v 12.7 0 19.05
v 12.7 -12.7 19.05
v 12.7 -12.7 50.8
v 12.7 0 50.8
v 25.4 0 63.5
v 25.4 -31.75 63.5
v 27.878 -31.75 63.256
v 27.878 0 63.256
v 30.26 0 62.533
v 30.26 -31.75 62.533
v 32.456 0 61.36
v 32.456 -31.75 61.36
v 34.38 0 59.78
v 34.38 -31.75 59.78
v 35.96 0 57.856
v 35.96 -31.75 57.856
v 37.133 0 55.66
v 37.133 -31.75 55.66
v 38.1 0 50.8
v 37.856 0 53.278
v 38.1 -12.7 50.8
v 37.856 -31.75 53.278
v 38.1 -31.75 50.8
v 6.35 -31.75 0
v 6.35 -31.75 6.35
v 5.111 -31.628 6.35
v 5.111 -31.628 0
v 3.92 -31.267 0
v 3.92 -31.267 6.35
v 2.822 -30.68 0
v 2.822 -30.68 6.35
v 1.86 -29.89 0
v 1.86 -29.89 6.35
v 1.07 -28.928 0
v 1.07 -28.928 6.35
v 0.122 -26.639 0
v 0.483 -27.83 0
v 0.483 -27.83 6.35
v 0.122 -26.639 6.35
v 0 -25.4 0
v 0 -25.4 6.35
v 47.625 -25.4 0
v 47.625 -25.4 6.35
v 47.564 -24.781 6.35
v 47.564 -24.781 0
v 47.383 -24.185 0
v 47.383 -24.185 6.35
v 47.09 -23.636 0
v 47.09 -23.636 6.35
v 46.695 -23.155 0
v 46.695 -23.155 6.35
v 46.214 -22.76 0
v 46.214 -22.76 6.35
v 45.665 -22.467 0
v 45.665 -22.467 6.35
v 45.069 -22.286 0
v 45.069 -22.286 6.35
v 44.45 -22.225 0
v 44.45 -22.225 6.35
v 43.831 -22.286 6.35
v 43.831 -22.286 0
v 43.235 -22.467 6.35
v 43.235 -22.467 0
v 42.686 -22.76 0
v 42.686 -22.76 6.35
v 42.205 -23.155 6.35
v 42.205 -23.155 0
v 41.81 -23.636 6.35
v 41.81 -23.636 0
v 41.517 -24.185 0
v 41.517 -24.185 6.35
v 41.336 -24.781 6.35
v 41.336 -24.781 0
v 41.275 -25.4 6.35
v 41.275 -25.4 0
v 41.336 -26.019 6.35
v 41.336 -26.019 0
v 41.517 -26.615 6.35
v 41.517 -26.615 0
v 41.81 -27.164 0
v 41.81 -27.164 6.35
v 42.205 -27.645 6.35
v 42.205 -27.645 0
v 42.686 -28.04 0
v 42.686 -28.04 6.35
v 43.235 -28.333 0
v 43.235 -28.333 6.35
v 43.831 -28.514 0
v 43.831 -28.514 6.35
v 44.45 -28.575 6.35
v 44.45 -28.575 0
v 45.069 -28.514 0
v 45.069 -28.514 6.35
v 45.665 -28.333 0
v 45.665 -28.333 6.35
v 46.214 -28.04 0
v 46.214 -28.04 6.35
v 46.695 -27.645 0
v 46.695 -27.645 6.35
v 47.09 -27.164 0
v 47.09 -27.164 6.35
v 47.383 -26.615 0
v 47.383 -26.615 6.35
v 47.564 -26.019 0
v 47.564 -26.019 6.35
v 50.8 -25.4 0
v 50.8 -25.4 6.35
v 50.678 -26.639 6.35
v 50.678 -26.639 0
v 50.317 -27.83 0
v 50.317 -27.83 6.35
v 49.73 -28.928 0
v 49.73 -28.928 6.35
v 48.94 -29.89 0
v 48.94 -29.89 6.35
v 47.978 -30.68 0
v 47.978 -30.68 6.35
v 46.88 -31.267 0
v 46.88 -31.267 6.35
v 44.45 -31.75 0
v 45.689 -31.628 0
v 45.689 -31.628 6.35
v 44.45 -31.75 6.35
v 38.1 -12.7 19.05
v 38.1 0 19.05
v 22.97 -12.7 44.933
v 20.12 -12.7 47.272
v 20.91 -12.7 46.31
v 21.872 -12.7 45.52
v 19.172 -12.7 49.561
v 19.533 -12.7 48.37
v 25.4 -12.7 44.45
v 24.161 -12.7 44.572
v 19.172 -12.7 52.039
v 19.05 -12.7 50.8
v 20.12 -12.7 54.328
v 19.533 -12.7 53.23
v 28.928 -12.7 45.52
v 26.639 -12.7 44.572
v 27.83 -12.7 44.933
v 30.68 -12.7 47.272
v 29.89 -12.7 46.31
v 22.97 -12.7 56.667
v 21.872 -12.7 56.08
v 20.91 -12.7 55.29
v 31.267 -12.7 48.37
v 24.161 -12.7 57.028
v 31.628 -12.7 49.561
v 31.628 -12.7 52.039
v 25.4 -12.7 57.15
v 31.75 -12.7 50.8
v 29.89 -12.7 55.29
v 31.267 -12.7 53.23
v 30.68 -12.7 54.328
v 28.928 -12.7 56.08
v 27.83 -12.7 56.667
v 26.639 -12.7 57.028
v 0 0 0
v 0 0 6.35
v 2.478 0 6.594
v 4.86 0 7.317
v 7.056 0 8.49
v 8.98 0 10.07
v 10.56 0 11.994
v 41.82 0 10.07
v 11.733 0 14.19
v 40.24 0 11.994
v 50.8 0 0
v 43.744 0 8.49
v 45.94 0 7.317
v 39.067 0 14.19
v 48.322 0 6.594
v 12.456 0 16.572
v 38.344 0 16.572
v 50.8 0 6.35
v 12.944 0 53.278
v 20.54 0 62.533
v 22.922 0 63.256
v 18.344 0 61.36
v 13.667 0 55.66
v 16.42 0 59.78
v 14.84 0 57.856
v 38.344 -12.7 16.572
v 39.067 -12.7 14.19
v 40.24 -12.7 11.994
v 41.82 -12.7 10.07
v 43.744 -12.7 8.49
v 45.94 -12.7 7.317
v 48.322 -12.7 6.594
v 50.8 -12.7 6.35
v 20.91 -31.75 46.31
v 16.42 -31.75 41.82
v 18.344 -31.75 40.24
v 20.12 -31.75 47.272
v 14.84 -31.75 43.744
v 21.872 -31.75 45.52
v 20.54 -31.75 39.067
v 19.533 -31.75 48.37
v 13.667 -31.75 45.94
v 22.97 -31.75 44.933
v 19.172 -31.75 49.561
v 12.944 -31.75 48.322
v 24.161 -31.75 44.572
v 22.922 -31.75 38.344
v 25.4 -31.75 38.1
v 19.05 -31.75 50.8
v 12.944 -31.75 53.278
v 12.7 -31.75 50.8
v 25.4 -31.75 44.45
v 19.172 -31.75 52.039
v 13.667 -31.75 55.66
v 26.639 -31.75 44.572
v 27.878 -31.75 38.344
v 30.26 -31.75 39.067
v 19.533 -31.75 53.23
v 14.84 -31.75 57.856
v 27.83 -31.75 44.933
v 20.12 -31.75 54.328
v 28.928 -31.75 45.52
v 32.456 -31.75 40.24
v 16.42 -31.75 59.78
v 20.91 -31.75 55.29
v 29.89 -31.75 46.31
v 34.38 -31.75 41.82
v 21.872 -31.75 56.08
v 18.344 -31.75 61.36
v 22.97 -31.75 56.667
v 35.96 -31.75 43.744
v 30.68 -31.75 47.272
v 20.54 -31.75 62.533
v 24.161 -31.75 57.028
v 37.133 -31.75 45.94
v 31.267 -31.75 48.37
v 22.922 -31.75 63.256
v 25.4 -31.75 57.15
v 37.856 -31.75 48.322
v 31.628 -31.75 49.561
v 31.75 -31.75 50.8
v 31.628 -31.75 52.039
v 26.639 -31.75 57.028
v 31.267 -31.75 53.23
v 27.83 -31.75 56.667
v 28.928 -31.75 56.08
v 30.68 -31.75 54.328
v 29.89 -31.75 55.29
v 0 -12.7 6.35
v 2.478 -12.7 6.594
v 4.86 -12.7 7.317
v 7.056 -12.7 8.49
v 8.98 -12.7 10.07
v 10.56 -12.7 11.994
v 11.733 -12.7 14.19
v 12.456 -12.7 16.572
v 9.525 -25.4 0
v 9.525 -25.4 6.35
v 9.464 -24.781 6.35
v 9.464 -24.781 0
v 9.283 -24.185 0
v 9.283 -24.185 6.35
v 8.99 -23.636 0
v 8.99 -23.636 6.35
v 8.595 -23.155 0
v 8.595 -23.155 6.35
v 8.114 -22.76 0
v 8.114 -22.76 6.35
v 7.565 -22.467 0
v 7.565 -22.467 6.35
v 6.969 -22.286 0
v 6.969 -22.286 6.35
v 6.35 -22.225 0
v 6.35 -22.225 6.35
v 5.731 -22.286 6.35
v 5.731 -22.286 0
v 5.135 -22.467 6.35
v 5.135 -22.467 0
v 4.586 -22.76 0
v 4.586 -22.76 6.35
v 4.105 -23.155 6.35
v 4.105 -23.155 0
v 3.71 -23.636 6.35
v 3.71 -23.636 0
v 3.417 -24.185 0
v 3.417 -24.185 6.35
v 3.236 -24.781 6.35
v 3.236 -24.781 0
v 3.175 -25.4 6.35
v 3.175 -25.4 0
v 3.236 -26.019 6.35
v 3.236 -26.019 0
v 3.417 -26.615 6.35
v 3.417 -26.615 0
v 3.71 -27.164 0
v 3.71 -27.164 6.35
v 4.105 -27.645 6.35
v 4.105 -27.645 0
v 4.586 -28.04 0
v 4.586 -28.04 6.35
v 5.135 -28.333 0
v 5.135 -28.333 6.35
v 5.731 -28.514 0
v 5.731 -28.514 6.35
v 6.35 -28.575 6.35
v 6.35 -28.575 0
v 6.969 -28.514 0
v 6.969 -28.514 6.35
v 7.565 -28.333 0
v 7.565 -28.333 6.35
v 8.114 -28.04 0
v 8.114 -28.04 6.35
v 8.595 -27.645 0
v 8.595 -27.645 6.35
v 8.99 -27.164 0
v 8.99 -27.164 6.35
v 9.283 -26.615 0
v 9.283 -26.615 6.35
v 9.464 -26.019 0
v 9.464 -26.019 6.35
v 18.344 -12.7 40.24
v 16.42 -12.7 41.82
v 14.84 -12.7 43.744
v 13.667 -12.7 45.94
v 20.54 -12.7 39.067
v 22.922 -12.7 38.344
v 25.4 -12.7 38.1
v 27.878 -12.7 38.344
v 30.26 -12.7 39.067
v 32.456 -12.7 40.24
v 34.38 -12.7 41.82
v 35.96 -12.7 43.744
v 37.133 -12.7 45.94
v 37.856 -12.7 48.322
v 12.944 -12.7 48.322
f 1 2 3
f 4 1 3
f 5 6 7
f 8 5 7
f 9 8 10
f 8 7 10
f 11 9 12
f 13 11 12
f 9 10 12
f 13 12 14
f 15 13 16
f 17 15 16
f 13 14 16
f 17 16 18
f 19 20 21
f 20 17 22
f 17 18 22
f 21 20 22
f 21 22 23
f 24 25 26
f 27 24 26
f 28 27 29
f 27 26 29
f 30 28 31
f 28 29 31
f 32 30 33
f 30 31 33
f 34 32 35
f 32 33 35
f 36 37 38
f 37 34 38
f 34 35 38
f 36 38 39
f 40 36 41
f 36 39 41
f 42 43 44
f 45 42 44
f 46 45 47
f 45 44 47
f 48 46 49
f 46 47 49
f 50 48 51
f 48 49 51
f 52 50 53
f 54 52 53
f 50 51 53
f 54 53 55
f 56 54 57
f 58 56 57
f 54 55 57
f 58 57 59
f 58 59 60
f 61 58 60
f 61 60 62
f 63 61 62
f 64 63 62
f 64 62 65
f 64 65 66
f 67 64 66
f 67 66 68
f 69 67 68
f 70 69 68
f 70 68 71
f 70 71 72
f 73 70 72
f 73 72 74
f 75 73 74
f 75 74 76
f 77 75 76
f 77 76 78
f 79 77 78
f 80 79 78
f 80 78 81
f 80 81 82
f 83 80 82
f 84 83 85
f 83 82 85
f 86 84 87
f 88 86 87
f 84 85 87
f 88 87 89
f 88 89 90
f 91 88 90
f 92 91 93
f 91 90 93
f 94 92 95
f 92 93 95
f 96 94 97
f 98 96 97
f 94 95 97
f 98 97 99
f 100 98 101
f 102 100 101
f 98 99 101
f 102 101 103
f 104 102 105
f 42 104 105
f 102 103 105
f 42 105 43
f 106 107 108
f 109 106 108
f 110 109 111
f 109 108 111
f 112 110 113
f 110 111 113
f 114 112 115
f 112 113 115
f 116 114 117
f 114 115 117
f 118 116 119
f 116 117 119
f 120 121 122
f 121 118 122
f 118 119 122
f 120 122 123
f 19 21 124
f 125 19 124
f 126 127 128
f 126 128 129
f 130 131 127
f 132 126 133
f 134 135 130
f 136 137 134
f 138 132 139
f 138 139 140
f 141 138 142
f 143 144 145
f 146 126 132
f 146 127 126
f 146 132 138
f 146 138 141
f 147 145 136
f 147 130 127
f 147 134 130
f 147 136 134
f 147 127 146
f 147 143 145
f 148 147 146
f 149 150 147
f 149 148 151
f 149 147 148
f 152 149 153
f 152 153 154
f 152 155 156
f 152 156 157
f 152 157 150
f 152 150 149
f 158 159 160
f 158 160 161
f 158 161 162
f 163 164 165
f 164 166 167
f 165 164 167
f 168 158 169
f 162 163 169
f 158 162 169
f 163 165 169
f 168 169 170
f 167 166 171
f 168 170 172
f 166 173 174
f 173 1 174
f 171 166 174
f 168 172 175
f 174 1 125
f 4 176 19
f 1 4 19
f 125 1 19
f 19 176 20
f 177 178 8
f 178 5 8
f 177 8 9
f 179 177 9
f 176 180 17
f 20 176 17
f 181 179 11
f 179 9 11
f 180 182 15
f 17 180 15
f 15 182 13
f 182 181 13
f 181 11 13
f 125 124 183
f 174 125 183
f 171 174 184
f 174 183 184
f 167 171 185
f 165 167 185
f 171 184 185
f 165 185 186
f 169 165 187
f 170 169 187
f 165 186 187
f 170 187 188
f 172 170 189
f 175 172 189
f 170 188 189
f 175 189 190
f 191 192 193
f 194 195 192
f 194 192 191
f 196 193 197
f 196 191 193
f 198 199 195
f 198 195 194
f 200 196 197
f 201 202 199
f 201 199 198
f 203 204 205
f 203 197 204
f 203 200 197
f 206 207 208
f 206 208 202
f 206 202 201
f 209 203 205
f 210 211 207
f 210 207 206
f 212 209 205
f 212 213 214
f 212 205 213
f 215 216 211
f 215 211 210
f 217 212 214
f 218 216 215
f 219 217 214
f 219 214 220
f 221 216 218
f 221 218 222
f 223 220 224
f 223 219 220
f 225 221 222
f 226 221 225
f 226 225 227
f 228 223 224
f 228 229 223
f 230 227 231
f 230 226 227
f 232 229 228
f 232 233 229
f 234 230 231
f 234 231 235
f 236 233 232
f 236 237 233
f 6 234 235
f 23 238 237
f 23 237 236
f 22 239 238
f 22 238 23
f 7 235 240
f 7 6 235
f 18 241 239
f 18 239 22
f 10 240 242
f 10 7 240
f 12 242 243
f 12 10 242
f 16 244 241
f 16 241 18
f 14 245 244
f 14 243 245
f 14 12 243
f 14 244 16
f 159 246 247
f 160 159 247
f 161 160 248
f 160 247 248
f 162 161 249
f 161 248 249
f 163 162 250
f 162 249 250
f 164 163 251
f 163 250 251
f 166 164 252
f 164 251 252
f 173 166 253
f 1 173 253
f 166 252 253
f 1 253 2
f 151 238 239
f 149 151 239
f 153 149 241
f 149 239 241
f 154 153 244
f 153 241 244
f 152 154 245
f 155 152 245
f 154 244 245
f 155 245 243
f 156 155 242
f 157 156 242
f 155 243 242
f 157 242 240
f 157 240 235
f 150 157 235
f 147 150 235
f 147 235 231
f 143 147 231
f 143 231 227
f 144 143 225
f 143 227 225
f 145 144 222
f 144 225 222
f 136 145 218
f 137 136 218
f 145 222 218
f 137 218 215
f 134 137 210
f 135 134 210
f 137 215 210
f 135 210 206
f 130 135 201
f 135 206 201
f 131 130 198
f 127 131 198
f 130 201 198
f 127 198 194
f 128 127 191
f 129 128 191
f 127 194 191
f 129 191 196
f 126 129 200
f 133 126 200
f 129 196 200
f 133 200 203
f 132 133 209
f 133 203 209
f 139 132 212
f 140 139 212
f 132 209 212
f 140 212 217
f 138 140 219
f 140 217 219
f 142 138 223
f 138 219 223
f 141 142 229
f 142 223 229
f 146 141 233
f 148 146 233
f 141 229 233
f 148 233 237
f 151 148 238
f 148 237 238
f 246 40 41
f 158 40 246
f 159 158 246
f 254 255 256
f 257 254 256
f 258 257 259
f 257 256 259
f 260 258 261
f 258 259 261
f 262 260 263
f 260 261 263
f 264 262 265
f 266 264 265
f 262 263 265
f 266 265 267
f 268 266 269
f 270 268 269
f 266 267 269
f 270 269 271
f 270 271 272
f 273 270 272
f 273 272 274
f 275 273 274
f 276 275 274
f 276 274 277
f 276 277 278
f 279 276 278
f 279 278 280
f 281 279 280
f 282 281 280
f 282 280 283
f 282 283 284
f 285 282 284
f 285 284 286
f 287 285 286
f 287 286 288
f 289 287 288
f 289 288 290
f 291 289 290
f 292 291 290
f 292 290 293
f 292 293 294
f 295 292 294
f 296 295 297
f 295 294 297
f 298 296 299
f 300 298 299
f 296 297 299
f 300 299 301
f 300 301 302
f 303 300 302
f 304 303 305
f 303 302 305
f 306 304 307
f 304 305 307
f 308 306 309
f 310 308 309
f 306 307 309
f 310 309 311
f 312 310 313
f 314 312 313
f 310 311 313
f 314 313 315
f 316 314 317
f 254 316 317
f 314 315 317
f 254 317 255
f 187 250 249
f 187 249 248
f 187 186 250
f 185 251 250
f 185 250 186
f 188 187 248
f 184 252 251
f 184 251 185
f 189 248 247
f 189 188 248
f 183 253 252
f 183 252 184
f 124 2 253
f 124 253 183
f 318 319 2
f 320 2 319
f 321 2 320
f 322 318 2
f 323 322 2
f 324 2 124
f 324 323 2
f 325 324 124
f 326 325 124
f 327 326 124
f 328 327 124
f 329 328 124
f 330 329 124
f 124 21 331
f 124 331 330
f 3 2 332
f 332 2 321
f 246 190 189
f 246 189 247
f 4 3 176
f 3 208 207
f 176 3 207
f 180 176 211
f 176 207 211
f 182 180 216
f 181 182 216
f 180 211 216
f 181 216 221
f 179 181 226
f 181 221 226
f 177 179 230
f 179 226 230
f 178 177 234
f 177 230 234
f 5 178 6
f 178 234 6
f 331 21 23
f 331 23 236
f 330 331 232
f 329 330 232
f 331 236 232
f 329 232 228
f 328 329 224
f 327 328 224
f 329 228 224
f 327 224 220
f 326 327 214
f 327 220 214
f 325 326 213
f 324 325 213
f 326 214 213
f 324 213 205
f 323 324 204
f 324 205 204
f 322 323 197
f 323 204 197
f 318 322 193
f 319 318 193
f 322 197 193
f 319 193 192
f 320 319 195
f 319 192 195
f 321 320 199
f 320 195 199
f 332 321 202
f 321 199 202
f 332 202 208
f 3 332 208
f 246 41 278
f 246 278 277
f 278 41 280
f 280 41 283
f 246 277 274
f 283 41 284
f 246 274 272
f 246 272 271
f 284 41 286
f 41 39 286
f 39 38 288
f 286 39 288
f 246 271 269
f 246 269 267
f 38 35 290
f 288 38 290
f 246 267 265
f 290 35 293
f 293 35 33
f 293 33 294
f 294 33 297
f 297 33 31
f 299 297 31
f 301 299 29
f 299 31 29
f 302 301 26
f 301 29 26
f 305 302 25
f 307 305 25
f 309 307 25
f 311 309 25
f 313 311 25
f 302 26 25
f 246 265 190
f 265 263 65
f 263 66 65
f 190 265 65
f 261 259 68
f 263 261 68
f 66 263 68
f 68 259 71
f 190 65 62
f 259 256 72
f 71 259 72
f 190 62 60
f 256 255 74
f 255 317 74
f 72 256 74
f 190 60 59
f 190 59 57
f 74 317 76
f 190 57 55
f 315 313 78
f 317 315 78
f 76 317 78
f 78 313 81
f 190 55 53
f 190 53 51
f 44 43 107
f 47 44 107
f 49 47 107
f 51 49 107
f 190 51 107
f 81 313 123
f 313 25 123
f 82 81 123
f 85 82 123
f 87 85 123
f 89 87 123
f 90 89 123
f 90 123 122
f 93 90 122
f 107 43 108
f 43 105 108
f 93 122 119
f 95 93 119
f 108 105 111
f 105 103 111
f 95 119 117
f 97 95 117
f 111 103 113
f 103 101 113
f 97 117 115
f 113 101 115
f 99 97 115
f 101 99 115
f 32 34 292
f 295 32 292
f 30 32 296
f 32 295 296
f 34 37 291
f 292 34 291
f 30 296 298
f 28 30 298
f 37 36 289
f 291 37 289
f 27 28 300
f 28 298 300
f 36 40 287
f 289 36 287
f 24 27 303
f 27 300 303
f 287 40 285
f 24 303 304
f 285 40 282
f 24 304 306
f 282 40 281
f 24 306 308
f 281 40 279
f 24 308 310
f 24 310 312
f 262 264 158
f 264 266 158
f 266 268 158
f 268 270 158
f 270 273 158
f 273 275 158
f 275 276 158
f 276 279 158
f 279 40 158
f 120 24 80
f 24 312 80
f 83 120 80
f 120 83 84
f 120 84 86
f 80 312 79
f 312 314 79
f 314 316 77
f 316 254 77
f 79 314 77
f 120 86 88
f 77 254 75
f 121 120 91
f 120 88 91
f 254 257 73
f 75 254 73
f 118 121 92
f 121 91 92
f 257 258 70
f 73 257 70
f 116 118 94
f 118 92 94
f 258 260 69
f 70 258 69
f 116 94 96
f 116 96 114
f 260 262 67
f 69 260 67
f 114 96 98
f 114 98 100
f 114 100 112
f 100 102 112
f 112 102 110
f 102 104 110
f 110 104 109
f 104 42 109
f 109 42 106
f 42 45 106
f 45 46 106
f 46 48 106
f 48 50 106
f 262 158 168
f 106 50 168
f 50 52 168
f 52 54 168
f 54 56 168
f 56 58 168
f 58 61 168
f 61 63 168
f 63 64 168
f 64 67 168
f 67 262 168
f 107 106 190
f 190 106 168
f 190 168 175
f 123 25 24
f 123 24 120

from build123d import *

# Parameters (mm, degrees)
F0_W     = 50.8
F0_H     = 63.5
F1_DEPTH = 31.75
F3_DEPTH = 31.75
F4_R     = 6.35
F5_DEPTH = 19.05
F6_R     = 3.175
F7_DEPTH = 25.4


with BuildPart() as f1:
    # F0 (on Front) → F1 (new body)
    with BuildSketch(Plane.XZ):
        with Locations((25.4, 31.75)):
            Rectangle(F0_W, F0_H)
    extrude(amount=F1_DEPTH)

    # F2 (on face) → F3 (cut)
    with BuildSketch(Plane.XZ.offset(31.75)):
        with BuildLine():
            Line((0, 63.5), (0, 6.35))
            ThreePointArc((0, 6.35), (8.980256, 10.069744), (12.7, 19.05))
            Line((12.7, 19.05), (12.7, 50.8))
            ThreePointArc((12.7, 50.8), (16.419744, 59.780256), (25.4, 63.5))
            Line((25.4, 63.5), (0, 63.5))
        make_face()
        with BuildLine():
            ThreePointArc((38.1, 19.05), (41.819744, 10.069744), (50.8, 6.35))
            Line((50.8, 6.35), (50.8, 63.5))
            Line((50.8, 63.5), (25.4, 63.5))
            ThreePointArc((25.4, 63.5), (34.380256, 59.780256), (38.1, 50.8))
            Line((38.1, 50.8), (38.1, 19.05))
        make_face()
    extrude(amount=-F3_DEPTH, mode=Mode.SUBTRACT)

    # F4 (on face) → F5 (cut)
    with BuildSketch(Plane.XZ.offset(31.75)):
        with BuildLine():
            Line((38.1, 19.05), (38.1, 50.8))
            ThreePointArc((38.1, 50.8), (25.4, 38.1), (12.7, 50.8))
            Line((12.7, 50.8), (12.7, 19.05))
            ThreePointArc((12.7, 19.05), (8.980256, 10.069744), (0, 6.35))
            Line((0, 6.35), (50.8, 6.35))
            ThreePointArc((50.8, 6.35), (41.819744, 10.069744), (38.1, 19.05))
        make_face()
        with Locations((25.4, 50.8)):
            Circle(F4_R)
    extrude(amount=-F5_DEPTH, mode=Mode.SUBTRACT)

    # F6 (on face) → F7 (cut)
    with BuildSketch(Plane.XY.offset(6.35)):
        with Locations((6.35, -25.4)):
            Circle(F6_R)
        with BuildLine():
            ThreePointArc((6.35, -31.75), (1.859872, -29.890128), (0, -25.4))
            Line((0, -25.4), (0, -31.75))
            Line((0, -31.75), (6.35, -31.75))
        make_face()
        with Locations((44.45, -25.4)):
            Circle(F6_R)
        with BuildLine():
            ThreePointArc((50.8, -25.4), (48.940128, -29.890128), (44.45, -31.75))
            Line((44.45, -31.75), (50.8, -31.75))
            Line((50.8, -31.75), (50.8, -25.4))
        make_face()
    extrude(amount=-F7_DEPTH, mode=Mode.SUBTRACT)


solid = f1.part
